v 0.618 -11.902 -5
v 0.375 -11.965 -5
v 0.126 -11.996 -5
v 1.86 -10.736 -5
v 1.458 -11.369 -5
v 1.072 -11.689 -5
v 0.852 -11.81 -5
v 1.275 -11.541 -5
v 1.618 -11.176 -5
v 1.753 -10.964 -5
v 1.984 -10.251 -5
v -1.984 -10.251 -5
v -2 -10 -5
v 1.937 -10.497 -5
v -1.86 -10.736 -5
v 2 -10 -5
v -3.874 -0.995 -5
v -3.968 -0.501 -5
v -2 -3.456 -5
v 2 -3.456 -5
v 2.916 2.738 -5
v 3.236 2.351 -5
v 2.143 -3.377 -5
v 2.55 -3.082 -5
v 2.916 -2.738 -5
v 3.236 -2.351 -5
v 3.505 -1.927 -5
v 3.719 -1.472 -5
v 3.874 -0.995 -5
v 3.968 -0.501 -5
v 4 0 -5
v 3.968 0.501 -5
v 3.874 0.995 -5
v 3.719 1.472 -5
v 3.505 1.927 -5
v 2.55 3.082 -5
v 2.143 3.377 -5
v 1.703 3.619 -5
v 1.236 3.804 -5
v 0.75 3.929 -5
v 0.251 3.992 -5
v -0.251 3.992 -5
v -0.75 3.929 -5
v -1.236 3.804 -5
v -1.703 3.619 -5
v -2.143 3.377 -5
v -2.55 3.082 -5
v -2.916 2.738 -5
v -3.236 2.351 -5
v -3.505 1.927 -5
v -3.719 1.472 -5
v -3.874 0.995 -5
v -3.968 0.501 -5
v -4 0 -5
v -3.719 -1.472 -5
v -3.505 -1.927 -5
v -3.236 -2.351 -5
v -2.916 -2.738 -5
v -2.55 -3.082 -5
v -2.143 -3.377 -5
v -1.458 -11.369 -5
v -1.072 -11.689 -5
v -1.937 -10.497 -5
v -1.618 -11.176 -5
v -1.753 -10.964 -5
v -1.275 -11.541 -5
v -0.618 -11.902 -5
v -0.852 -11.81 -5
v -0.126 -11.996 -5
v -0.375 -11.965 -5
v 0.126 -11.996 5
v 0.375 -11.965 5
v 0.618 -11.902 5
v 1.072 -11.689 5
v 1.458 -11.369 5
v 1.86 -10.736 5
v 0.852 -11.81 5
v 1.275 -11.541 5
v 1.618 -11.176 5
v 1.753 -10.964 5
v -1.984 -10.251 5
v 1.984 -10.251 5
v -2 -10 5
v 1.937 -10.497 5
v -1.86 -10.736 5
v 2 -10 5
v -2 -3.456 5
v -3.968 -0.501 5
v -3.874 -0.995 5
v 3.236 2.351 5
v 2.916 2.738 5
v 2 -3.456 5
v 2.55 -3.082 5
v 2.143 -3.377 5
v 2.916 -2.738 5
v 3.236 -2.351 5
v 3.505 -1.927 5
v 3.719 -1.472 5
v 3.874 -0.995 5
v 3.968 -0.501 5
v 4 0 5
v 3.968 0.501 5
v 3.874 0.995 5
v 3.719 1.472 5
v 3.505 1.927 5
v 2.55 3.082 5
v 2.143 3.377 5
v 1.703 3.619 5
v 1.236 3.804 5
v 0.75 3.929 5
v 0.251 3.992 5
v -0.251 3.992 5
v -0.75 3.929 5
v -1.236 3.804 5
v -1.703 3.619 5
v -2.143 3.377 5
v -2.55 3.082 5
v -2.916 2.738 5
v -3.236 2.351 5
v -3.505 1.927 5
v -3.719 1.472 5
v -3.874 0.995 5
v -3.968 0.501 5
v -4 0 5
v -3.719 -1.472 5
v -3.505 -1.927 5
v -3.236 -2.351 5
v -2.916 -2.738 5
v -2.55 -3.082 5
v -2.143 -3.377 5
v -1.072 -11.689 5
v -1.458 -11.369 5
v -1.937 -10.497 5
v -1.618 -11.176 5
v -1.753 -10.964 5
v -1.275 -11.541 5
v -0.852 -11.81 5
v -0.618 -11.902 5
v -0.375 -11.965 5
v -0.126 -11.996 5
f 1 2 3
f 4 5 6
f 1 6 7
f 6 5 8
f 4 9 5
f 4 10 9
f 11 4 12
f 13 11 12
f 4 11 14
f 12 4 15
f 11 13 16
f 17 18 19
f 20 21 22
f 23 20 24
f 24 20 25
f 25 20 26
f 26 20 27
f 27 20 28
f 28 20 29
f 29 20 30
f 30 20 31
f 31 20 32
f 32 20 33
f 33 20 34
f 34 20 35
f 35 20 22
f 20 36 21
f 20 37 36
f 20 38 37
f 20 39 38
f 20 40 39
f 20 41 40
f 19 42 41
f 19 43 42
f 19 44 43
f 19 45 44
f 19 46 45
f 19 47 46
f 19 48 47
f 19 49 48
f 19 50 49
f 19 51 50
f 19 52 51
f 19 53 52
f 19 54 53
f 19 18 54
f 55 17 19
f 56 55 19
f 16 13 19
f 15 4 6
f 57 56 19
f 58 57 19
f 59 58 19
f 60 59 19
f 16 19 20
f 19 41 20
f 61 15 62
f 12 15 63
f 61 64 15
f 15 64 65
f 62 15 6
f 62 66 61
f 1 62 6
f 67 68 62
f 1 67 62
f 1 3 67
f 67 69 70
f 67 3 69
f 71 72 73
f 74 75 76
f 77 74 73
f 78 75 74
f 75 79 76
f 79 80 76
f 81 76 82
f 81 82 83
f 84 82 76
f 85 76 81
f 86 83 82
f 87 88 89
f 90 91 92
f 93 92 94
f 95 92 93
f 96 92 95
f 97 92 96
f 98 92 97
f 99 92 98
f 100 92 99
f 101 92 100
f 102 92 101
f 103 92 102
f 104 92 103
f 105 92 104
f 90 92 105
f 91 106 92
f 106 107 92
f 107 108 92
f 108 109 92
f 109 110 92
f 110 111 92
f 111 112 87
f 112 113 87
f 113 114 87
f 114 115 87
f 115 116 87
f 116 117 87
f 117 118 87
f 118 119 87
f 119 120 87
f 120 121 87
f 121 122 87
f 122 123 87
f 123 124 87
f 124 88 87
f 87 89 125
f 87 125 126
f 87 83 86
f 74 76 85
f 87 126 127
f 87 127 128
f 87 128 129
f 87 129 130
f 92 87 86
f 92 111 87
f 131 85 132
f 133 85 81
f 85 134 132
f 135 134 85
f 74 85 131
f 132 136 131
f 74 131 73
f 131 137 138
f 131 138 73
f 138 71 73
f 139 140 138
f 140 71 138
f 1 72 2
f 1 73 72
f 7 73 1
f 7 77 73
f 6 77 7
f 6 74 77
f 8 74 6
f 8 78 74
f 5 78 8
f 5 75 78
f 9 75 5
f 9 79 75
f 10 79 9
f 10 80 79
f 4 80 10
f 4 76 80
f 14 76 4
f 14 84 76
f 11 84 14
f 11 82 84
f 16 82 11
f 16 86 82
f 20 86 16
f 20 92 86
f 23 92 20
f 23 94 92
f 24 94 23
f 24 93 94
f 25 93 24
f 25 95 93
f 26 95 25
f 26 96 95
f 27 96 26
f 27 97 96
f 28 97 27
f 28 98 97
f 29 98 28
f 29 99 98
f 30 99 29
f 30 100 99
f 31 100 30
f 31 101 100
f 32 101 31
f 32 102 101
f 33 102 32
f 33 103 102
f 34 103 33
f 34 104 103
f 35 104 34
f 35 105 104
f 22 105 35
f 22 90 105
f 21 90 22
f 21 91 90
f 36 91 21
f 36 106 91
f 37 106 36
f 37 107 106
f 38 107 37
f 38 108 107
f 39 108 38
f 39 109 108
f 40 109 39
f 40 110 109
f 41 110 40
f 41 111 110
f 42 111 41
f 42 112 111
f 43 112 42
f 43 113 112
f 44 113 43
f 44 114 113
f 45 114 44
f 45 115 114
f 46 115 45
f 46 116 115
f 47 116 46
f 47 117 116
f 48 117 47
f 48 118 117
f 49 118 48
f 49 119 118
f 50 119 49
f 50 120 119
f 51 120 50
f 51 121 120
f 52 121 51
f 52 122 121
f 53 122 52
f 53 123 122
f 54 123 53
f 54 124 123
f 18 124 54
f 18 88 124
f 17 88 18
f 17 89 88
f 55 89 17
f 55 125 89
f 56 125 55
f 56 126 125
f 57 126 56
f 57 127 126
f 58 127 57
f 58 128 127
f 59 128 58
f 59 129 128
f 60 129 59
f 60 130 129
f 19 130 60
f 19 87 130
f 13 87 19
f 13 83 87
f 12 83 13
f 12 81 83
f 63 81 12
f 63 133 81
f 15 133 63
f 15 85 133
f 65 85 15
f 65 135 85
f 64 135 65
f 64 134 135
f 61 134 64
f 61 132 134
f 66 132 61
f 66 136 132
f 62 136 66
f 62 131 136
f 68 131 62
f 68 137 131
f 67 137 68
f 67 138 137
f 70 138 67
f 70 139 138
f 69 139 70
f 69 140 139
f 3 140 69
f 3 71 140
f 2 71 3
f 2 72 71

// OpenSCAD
module keyhole(
    head_diameter = 8,      // Diameter of the top (screw head)
    shaft_diameter = 4,     // Diameter of the bottom (screw shaft)
    slot_length = 10,       // Distance from head center to shaft center
    thickness = 10,          // Height (for 3D extrusion)
    rounded = true,          // Optionally use rounded connector
    centered = true,        // Center the keyhole on the z axis
) {
    if (centered) translate([0, 0, -thickness / 2])
    // Extruded 2D shape
    linear_extrude(height = thickness) {
        if (rounded) {
            hull() {
                translate([0, 0]) circle(head_diameter / 2, $fn=50);
                translate([0, -slot_length]) circle(shaft_diameter / 2, $fn=50);
            }
        } else {
            // Sharp transition
            union() {
                circle(head_diameter / 2, $fn=50);
                translate([0, -slot_length])
                    circle(shaft_diameter / 2, $fn=50);
                translate([-shaft_diameter / 2, -slot_length])
                    square([shaft_diameter, slot_length]);
            }
        }
    }
}

keyhole(rounded=false);
